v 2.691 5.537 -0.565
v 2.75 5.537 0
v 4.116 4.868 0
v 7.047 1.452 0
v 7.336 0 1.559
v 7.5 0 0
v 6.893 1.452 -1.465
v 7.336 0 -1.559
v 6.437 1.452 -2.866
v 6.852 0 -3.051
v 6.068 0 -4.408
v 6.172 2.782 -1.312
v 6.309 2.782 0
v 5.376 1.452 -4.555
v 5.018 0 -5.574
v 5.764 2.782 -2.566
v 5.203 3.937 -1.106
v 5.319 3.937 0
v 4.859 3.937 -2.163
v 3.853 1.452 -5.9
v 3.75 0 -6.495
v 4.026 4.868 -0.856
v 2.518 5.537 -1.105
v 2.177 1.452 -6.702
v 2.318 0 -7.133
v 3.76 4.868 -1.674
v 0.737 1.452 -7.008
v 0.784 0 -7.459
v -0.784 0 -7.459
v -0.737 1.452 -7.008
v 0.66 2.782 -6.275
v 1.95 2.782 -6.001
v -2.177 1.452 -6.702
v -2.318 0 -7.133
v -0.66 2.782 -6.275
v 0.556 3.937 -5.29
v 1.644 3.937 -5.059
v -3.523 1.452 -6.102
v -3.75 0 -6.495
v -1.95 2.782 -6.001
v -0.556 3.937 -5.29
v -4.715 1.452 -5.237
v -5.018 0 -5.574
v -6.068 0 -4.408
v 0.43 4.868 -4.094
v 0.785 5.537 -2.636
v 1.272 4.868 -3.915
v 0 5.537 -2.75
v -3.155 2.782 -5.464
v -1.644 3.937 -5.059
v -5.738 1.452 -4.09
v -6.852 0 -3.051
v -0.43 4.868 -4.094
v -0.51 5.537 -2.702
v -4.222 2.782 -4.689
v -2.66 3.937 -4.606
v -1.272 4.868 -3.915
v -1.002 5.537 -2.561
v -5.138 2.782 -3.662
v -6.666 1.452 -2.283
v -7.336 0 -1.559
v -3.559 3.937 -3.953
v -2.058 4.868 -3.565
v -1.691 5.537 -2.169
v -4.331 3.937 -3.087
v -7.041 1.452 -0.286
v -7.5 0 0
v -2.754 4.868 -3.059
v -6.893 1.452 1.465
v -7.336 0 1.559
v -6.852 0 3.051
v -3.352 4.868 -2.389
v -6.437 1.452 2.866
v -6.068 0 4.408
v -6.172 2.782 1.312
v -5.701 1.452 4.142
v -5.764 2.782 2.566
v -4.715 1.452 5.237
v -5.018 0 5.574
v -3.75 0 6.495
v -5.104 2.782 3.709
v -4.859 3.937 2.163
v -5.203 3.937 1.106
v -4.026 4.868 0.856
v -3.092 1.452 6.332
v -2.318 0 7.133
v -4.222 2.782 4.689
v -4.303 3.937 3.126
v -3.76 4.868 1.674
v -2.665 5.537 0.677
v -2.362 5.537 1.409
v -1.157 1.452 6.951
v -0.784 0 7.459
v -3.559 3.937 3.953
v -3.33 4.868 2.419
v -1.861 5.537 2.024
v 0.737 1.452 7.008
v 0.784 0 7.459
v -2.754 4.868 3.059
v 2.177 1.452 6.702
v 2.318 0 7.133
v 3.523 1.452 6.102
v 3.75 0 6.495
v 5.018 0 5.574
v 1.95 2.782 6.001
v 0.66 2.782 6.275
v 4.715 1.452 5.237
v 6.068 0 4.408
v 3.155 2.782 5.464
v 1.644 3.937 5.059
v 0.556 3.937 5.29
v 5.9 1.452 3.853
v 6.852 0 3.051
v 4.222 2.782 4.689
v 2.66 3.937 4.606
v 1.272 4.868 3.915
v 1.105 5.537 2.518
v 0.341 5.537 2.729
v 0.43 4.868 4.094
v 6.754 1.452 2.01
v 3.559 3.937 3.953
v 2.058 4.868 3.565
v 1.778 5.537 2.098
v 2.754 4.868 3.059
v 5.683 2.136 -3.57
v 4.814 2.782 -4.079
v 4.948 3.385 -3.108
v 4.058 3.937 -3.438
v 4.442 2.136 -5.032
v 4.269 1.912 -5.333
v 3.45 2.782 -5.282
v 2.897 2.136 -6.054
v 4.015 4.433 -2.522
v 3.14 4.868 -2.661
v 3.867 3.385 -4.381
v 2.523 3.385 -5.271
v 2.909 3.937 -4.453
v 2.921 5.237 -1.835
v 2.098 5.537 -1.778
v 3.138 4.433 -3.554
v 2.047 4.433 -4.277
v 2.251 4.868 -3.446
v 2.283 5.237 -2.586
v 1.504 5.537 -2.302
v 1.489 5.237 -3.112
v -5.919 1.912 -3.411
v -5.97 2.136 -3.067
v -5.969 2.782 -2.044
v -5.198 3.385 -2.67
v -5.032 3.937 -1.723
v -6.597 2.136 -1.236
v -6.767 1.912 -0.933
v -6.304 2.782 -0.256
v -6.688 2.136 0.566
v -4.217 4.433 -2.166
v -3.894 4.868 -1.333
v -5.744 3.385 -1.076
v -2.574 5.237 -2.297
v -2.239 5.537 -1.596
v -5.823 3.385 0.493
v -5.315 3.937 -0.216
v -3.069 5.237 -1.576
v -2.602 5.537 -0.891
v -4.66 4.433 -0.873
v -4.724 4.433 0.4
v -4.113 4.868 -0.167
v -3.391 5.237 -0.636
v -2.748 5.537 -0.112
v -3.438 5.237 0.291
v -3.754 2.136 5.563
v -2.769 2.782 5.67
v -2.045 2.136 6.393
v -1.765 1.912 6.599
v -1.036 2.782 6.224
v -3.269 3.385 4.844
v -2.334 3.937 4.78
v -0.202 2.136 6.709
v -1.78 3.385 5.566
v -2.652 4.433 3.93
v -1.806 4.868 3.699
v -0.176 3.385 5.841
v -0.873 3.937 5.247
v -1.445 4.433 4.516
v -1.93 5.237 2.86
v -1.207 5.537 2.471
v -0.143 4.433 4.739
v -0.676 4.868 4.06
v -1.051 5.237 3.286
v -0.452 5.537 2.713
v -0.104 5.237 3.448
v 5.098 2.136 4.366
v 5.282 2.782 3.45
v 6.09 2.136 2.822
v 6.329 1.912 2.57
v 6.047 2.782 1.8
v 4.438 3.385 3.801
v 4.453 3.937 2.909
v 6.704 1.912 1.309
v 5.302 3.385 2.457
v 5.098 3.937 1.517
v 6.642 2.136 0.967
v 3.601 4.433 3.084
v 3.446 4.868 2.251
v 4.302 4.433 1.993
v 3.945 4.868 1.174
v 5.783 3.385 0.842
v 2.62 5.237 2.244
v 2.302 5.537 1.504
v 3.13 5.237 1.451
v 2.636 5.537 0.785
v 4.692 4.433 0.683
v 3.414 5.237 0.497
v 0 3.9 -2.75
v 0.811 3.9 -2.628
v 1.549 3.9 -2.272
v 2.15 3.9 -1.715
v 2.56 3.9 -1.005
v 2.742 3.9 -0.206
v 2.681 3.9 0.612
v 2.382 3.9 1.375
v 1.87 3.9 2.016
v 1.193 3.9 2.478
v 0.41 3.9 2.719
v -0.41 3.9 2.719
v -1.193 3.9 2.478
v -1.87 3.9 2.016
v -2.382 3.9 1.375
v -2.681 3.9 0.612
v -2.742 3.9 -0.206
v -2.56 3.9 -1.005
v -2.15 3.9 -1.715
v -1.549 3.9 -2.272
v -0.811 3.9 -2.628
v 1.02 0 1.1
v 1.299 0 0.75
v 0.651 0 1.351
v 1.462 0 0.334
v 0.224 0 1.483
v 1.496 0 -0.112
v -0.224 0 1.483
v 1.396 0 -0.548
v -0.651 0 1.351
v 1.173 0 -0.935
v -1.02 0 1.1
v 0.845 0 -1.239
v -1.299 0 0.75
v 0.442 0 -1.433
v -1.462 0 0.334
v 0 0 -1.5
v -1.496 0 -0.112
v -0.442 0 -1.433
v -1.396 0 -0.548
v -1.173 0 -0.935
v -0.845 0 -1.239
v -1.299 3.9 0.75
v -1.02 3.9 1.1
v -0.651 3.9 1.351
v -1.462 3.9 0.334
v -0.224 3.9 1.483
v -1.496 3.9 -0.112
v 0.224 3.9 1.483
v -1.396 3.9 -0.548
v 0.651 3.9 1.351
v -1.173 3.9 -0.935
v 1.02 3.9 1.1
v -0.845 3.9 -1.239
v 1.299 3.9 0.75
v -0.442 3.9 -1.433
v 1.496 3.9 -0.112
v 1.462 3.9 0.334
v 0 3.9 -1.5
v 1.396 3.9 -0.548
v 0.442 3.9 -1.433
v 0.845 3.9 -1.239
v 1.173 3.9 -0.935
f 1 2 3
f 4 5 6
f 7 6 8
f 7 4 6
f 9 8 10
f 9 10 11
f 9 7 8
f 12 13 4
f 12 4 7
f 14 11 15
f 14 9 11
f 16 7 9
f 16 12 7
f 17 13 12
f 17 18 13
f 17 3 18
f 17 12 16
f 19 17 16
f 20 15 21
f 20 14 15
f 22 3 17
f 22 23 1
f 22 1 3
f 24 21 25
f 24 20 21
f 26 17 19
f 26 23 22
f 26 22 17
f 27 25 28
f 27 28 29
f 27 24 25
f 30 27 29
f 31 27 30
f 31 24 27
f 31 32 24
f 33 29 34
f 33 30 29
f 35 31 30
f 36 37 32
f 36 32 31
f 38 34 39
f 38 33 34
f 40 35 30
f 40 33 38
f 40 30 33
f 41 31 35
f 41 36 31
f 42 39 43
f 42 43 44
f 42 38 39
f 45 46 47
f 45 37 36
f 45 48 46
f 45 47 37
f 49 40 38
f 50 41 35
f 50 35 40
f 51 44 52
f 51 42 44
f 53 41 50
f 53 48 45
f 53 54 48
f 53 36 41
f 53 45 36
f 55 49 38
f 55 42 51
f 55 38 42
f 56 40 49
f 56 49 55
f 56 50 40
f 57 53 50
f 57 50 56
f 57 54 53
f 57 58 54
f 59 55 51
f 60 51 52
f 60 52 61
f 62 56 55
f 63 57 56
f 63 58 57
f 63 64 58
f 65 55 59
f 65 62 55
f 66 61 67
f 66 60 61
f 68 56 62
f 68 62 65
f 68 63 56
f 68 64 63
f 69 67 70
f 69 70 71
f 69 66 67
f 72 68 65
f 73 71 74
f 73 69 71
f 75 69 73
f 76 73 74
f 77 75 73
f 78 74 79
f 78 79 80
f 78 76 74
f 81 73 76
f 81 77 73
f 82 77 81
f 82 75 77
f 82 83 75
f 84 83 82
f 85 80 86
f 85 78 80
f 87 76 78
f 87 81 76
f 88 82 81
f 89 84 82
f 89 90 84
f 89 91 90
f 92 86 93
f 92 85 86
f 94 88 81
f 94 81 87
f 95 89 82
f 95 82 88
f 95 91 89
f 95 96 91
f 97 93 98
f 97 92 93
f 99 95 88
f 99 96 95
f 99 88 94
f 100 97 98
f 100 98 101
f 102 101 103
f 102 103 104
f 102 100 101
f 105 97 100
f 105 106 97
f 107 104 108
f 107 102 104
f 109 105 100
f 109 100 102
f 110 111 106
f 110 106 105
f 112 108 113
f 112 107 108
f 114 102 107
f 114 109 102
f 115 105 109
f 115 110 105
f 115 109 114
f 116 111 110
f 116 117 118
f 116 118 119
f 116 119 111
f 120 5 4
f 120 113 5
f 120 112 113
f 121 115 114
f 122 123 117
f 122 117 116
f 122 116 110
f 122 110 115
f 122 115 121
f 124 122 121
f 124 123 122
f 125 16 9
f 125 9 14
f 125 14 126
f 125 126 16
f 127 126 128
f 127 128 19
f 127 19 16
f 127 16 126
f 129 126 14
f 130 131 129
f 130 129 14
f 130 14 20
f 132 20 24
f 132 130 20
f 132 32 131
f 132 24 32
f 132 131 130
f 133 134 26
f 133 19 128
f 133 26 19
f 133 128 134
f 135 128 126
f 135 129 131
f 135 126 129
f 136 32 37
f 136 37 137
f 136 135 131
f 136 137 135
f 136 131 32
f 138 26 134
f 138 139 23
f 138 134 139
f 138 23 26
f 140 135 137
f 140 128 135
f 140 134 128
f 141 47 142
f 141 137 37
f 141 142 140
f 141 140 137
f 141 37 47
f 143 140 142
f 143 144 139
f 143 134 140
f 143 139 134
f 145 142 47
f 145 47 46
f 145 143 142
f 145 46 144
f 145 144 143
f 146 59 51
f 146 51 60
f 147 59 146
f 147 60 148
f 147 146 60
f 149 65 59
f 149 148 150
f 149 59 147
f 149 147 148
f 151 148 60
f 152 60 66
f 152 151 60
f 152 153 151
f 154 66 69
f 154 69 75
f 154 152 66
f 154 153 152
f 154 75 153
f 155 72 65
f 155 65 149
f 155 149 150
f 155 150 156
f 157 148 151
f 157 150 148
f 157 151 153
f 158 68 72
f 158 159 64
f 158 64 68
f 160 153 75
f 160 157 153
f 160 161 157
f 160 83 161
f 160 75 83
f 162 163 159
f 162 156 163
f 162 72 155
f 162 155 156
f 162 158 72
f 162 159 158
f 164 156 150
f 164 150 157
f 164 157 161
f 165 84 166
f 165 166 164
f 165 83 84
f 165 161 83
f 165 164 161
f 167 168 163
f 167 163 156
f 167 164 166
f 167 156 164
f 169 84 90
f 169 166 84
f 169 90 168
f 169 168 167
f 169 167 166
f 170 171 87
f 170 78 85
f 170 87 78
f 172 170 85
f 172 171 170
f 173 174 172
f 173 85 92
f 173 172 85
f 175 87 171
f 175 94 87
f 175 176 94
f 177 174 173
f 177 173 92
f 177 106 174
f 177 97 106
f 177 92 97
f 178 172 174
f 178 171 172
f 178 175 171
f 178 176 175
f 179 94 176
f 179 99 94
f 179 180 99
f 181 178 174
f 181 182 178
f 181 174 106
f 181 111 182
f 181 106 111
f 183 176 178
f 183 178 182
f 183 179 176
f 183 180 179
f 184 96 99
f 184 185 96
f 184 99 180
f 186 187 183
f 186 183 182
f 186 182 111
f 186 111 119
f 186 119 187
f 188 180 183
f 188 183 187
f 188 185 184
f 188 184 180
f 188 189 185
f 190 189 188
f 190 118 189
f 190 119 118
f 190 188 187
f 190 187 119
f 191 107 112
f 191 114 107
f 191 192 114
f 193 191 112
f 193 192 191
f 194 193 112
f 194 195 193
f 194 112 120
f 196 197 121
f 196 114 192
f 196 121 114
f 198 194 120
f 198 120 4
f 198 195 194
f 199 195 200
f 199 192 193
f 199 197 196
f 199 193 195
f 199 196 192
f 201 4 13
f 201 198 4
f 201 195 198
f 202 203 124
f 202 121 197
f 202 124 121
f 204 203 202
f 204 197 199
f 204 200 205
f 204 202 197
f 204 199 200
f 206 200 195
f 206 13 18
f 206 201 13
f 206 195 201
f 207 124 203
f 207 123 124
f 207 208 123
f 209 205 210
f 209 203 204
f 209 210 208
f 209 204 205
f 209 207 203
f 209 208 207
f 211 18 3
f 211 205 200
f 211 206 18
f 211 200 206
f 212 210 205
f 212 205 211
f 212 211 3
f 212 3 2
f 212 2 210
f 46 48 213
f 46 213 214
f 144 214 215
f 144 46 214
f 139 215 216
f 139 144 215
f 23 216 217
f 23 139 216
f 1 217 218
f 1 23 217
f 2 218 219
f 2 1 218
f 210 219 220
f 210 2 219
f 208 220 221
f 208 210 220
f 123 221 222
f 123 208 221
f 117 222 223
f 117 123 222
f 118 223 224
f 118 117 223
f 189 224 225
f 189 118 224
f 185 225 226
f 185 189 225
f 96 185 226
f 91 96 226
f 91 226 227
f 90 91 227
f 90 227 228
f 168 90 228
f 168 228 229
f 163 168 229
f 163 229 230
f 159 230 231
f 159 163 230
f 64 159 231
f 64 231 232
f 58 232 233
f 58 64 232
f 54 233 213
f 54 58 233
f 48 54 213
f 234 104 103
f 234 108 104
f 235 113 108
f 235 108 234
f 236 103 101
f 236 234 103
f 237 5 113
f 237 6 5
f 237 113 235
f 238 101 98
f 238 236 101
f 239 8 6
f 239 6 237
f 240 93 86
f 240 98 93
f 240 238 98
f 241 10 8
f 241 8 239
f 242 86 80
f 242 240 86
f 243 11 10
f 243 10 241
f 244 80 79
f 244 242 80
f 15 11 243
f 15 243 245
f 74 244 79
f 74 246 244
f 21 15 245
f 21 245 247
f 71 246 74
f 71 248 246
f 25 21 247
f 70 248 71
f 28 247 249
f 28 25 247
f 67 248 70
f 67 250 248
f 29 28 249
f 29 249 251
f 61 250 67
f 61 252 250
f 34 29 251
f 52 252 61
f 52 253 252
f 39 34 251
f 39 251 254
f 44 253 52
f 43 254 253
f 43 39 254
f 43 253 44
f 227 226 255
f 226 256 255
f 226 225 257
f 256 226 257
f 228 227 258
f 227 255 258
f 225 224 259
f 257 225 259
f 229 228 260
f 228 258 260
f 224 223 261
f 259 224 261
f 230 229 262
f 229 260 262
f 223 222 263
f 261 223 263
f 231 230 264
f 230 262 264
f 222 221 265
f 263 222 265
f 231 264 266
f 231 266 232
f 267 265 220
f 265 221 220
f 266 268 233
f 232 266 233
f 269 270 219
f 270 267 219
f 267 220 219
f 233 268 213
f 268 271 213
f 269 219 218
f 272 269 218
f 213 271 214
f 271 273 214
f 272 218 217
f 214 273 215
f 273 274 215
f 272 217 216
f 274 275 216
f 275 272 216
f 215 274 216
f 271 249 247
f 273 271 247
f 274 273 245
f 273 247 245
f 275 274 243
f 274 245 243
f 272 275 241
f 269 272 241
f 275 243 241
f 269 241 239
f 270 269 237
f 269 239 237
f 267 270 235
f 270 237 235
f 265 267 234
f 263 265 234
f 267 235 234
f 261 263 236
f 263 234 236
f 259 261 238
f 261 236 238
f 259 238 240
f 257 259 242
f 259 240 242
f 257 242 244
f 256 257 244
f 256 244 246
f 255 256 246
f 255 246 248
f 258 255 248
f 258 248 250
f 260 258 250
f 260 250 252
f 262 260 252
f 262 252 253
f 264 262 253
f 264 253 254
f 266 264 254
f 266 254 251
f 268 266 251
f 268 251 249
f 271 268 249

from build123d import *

# Parameters (mm, degrees)
SKETCH2_R          = 1.5
CUT_EXTRUDE1_DEPTH = 13.186808537
SKETCH4_R          = 2.75
CUT_EXTRUDE2_DEPTH = 2.1


with BuildPart() as part:
    # Sketch1 → Revolve1 (revolve)
    with BuildSketch(Plane.XY):
        with BuildLine():
            Line((0, 0), (7.5, 0))
            ThreePointArc((7.5, 0), (4.836432575, 4.358040719), (0, 6))
            Line((0, 6), (0, 0))
        make_face()
    revolve(axis=Axis((0, 0, 0), (0, 1, 0)))

    # Sketch2 → Cut-Extrude1 (cut, through all)
    with BuildSketch(Plane.XZ):
        with Locations(Location((0, 0, 0), (0, 0, 270))):
            Circle(SKETCH2_R)
    extrude(amount=-CUT_EXTRUDE1_DEPTH, mode=Mode.SUBTRACT)

    # Sketch4 → Cut-Extrude2 (cut)
    with BuildSketch(Plane(origin=(0, 6, 0), x_dir=(-1, 0, 0), z_dir=(0, -1, 0))):
        with Locations(Location((0, 0, 0), (0, 0, 90))):
            Circle(SKETCH4_R)
    extrude(amount=CUT_EXTRUDE2_DEPTH, mode=Mode.SUBTRACT)


solid = part.part
